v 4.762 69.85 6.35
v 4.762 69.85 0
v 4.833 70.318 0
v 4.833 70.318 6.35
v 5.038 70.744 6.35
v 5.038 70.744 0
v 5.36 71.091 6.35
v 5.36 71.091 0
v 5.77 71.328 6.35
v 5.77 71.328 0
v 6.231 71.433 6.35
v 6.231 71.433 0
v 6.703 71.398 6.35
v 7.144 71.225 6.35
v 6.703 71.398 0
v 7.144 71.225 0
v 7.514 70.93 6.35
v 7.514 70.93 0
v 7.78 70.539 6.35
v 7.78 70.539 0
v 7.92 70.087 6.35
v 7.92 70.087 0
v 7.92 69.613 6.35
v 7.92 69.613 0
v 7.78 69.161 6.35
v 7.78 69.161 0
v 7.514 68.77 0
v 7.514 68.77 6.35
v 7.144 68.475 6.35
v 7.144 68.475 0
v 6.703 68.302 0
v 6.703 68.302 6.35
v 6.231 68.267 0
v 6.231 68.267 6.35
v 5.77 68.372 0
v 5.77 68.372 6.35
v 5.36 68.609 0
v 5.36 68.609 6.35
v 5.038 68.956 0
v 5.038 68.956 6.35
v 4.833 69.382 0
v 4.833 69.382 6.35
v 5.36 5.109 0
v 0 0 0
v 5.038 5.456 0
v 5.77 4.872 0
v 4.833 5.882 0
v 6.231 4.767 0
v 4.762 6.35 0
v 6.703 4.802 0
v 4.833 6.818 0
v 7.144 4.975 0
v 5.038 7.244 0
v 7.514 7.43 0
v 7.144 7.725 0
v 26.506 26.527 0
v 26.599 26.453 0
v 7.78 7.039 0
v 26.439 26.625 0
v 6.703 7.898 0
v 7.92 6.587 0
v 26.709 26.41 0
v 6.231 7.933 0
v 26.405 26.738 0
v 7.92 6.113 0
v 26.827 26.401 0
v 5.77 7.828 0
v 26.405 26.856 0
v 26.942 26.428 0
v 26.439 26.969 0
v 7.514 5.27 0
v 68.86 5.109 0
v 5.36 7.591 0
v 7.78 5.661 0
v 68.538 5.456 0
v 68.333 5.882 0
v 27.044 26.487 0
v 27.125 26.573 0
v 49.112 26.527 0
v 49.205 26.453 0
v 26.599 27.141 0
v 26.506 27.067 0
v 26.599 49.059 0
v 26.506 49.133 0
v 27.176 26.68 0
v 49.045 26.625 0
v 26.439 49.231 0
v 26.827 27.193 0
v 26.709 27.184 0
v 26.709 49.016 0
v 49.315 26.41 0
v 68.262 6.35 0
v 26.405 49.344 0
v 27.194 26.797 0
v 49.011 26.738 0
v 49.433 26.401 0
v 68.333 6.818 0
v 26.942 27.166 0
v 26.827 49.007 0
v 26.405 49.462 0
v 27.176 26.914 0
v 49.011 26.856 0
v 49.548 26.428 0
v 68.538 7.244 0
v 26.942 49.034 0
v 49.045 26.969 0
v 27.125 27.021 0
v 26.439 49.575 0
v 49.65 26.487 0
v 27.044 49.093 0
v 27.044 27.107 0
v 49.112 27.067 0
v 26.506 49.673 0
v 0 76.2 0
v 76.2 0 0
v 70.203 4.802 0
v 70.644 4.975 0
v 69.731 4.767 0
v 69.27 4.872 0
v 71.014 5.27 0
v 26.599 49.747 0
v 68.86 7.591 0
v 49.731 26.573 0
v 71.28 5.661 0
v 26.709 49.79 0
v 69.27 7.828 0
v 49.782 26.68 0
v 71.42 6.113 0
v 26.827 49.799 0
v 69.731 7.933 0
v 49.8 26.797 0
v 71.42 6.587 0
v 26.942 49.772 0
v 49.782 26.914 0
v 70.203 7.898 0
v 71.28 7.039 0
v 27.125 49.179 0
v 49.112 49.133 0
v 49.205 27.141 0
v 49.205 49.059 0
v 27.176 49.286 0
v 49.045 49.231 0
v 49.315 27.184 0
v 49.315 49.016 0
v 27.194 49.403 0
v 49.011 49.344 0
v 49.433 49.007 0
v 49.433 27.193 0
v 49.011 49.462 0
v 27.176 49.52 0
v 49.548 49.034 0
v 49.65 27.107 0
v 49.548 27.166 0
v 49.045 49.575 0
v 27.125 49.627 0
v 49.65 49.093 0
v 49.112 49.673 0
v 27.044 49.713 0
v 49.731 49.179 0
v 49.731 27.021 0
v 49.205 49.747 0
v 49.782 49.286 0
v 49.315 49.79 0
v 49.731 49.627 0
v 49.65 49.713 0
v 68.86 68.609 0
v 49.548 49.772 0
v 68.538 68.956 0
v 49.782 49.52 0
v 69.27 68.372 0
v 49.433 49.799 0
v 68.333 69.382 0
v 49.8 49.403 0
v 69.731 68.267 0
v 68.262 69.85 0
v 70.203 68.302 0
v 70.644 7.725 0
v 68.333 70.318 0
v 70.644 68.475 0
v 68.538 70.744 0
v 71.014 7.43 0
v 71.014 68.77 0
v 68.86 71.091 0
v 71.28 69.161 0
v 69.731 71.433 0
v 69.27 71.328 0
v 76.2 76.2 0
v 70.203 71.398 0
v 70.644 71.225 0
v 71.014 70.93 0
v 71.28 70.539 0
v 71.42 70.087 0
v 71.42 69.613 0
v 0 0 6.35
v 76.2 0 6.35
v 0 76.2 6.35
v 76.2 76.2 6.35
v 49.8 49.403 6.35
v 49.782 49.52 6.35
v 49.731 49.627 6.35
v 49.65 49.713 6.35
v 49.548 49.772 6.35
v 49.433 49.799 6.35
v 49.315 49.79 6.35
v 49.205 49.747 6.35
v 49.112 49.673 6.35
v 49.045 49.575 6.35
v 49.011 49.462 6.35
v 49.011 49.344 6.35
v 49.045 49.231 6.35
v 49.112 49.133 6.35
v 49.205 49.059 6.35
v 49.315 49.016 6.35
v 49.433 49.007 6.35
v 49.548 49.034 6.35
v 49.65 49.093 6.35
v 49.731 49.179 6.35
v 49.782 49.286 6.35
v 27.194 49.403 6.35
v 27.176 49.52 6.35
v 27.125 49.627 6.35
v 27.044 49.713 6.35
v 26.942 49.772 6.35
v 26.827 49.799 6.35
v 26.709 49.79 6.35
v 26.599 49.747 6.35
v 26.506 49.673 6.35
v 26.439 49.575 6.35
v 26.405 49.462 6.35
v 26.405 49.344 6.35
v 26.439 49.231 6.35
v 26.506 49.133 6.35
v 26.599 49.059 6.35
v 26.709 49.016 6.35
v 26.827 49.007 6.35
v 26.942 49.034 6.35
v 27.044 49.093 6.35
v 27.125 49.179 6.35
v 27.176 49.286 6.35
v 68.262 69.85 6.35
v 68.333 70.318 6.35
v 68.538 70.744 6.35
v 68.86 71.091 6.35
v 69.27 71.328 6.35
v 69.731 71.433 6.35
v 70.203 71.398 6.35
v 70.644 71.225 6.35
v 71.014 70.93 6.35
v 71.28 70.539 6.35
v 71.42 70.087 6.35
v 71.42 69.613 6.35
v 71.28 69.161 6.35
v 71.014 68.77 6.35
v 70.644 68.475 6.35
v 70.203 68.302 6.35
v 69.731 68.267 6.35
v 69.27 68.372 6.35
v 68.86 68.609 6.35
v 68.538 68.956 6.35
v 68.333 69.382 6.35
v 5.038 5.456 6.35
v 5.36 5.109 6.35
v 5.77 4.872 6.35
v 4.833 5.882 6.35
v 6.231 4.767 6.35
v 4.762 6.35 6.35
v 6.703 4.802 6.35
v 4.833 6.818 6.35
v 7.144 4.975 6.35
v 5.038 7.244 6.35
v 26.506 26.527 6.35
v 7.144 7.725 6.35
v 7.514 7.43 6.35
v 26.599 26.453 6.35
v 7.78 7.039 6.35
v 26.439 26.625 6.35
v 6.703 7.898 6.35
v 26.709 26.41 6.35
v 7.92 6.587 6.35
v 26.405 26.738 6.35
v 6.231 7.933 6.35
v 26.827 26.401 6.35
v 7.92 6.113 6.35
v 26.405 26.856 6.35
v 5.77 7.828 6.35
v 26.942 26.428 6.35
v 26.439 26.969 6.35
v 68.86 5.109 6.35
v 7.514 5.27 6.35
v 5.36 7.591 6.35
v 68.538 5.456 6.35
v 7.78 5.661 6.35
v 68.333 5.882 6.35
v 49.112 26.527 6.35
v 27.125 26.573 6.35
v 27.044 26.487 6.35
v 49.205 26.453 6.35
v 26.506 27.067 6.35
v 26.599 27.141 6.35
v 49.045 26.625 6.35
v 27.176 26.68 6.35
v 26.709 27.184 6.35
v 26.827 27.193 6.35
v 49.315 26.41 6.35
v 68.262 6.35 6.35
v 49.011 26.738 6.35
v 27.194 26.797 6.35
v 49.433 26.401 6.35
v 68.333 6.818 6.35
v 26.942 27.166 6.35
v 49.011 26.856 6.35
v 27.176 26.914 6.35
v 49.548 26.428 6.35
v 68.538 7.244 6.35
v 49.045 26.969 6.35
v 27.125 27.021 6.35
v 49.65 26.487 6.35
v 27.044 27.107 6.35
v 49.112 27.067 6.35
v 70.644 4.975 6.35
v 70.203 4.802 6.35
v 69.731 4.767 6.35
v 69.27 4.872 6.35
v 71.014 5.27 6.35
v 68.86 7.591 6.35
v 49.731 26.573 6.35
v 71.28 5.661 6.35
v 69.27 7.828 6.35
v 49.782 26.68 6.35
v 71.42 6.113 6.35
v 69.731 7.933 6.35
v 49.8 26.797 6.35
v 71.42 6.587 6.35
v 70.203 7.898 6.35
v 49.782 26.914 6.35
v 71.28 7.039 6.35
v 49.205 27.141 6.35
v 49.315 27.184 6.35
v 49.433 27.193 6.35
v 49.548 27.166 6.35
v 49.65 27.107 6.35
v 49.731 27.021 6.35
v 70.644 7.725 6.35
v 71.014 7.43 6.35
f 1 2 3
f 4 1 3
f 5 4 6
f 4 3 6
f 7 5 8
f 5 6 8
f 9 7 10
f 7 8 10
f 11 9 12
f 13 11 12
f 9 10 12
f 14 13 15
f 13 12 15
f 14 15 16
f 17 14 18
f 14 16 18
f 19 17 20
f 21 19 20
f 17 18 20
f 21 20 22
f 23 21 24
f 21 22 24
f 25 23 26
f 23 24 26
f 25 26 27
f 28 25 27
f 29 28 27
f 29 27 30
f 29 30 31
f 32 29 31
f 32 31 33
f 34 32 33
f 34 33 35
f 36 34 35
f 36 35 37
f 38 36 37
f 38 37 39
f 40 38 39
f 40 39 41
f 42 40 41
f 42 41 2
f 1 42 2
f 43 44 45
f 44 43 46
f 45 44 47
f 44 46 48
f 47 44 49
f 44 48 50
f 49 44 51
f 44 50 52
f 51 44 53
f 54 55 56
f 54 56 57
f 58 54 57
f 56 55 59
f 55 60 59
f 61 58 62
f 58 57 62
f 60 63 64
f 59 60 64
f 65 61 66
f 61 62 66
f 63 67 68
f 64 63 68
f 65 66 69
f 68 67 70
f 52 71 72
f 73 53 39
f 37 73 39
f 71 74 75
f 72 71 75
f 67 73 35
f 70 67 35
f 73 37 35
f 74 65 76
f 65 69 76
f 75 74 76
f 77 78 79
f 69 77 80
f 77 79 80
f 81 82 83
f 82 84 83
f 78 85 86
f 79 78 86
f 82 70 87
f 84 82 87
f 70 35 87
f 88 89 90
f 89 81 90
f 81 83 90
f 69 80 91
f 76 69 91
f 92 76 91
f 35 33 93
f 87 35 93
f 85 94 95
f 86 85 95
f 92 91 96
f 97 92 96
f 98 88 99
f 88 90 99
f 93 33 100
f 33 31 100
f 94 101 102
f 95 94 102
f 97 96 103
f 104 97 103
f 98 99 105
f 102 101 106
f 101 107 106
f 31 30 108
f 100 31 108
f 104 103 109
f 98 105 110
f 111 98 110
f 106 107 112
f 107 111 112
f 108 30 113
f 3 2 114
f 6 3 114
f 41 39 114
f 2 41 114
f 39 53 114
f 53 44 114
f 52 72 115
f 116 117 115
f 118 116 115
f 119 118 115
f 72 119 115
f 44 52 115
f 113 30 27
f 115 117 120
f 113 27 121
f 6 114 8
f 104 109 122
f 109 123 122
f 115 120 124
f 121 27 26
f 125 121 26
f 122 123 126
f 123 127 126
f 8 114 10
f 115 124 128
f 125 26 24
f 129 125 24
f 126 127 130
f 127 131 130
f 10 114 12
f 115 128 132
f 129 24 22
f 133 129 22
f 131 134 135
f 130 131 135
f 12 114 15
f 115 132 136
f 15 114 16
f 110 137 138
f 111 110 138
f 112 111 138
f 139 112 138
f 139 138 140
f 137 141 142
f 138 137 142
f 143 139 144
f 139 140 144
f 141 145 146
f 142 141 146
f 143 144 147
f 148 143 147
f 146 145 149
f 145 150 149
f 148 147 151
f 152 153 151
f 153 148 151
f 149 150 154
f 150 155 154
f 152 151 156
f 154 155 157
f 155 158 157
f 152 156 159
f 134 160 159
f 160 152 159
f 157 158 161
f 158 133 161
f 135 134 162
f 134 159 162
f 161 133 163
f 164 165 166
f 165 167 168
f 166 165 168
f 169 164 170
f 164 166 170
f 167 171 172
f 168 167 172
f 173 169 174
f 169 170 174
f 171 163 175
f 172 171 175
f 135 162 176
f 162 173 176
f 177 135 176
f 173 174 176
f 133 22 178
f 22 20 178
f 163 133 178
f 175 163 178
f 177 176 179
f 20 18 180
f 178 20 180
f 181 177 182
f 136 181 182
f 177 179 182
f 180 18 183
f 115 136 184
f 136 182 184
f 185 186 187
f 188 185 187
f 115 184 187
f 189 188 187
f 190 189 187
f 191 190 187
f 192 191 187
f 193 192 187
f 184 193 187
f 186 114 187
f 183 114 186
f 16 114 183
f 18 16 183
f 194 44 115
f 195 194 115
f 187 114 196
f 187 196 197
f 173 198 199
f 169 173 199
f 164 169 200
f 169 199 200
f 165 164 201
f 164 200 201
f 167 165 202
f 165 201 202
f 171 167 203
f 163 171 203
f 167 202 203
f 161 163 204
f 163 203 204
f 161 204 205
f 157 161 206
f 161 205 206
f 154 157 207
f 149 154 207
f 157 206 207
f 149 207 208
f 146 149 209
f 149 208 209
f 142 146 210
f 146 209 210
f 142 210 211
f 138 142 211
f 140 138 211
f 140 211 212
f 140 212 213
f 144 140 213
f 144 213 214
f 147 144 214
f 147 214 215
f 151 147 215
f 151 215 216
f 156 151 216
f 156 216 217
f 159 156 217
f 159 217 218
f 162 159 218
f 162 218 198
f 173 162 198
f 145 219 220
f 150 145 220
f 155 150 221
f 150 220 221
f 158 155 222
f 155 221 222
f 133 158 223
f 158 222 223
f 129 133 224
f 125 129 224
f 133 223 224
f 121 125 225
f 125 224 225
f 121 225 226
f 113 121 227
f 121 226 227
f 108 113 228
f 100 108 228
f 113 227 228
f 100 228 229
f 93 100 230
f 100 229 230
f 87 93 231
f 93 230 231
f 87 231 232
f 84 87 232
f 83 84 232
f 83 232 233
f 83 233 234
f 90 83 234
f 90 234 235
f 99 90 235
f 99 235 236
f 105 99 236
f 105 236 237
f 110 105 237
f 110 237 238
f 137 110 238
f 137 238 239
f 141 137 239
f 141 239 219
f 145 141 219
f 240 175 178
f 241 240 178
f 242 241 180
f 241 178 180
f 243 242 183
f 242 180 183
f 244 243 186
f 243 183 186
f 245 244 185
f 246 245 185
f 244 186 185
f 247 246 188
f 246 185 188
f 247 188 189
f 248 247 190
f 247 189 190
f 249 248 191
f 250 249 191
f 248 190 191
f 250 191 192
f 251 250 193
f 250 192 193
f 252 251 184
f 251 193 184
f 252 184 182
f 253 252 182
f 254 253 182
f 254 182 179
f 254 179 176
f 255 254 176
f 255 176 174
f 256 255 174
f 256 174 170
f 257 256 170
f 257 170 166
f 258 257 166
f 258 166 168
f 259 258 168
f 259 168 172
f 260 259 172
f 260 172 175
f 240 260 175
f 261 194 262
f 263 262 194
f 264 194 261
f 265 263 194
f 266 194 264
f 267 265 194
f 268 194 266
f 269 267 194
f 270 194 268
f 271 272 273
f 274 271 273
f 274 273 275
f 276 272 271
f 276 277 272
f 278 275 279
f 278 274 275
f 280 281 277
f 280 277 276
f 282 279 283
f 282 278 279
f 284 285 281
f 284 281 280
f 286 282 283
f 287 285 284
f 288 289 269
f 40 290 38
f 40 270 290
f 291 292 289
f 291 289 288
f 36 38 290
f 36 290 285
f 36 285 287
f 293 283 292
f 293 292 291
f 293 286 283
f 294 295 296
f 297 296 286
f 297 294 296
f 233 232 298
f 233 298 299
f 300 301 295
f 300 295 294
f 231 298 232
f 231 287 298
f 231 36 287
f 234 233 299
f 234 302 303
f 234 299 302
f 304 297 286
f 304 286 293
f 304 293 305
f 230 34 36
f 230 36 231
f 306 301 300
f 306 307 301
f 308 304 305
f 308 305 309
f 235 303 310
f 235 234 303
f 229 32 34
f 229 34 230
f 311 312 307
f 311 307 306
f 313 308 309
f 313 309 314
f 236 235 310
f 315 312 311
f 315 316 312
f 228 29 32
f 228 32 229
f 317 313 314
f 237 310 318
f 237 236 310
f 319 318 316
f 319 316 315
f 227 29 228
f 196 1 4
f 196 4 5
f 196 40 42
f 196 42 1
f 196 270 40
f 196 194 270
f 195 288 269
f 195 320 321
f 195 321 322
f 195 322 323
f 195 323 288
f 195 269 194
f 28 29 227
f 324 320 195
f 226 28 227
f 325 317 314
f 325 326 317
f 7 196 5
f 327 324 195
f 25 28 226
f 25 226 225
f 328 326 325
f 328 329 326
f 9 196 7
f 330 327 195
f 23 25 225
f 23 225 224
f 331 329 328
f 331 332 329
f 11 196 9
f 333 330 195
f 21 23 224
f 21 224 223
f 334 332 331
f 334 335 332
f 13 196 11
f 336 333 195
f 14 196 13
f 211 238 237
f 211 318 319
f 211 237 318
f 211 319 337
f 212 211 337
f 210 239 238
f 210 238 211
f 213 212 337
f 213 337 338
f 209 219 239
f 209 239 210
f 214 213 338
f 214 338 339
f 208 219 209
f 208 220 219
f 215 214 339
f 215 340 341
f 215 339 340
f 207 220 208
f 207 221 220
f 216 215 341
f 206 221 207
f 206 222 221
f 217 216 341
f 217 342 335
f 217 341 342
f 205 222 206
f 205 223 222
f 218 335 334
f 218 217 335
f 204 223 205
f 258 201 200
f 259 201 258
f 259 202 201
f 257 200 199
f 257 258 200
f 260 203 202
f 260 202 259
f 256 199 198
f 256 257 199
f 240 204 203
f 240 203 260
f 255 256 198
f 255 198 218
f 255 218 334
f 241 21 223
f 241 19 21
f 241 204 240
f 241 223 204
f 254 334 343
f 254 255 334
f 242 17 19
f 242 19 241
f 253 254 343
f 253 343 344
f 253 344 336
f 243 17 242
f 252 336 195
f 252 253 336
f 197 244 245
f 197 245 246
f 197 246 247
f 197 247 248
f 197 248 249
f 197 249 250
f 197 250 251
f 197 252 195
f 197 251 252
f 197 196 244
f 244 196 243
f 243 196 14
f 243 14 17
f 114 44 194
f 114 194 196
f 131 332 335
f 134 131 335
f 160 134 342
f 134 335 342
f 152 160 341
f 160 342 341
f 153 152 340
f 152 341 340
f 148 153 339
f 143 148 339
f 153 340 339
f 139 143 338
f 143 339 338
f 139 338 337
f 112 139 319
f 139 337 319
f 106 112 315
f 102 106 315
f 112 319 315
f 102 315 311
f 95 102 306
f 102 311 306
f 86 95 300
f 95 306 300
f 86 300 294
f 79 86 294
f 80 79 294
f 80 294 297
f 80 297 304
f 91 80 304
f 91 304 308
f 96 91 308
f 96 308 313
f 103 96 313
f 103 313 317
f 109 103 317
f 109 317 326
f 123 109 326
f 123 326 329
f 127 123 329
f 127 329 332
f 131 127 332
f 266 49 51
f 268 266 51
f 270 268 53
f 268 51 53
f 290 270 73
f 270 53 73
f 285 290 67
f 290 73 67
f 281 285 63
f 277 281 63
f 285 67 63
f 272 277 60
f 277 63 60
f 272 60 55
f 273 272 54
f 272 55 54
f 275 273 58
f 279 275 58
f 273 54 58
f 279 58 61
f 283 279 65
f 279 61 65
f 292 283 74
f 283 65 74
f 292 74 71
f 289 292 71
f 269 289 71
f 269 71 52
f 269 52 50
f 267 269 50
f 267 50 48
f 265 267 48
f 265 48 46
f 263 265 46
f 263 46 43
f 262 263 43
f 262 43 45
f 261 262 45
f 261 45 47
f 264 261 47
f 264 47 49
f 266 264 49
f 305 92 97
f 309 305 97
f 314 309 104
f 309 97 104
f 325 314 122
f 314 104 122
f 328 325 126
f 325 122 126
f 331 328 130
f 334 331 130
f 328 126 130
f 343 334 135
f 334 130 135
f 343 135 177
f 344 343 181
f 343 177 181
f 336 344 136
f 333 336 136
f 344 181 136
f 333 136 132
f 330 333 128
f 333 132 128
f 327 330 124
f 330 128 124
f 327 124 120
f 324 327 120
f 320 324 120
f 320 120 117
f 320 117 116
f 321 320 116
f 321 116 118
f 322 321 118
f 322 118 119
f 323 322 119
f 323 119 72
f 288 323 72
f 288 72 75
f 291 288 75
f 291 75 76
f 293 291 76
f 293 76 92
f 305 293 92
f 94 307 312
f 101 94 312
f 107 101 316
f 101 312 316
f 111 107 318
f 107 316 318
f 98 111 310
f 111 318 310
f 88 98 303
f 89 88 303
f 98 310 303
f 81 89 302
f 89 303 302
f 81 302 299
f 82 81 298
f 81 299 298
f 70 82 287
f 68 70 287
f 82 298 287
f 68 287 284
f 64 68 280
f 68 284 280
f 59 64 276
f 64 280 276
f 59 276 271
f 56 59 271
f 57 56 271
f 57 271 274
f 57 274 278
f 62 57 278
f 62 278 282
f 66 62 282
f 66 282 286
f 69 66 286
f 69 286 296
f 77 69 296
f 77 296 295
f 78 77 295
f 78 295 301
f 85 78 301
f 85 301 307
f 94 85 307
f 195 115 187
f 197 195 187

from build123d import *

# Parameters (mm, degrees)
SKETCH1_W           = 76.2
SKETCH1_H           = 76.2
BOSS_EXTRUDE1_DEPTH = 6.35
SKETCH3_R           = 0.396875
CUT_EXTRUDE2_DEPTH  = 7.35
SKETCH4_R           = 1.5875
CUT_EXTRUDE3_DEPTH  = 7.35


with BuildPart() as part:
    # Sketch1 → Boss-Extrude1 (new body)
    with BuildSketch(Plane.XY):
        with Locations((38.1, 38.1)):
            Rectangle(SKETCH1_W, SKETCH1_H)
    extrude(amount=BOSS_EXTRUDE1_DEPTH)

    # Sketch3 → Cut-Extrude2 (cut, through all)
    with BuildSketch(Plane.XY.offset(6.35)):
        with Locations((49.403, 49.403)):
            Circle(SKETCH3_R)
        with Locations((26.797, 49.403)):
            Circle(SKETCH3_R)
        with Locations((26.797, 26.797)):
            Circle(SKETCH3_R)
        with Locations((49.403, 26.797)):
            Circle(SKETCH3_R)
    extrude(amount=-CUT_EXTRUDE2_DEPTH, mode=Mode.SUBTRACT)

    # Sketch4 → Cut-Extrude3 (cut, through all)
    with BuildSketch(Plane(origin=(0, 0, 0), x_dir=(-1, 0, 0), z_dir=(0, 0, -1))):
        with Locations((-6.35, 69.85)):
            Circle(SKETCH4_R)
        with Locations((-6.35, 6.35)):
            Circle(SKETCH4_R)
        with Locations((-69.85, 69.85)):
            Circle(SKETCH4_R)
        with Locations((-69.85, 6.35)):
            Circle(SKETCH4_R)
    extrude(amount=-CUT_EXTRUDE3_DEPTH, mode=Mode.SUBTRACT)


solid = part.part
